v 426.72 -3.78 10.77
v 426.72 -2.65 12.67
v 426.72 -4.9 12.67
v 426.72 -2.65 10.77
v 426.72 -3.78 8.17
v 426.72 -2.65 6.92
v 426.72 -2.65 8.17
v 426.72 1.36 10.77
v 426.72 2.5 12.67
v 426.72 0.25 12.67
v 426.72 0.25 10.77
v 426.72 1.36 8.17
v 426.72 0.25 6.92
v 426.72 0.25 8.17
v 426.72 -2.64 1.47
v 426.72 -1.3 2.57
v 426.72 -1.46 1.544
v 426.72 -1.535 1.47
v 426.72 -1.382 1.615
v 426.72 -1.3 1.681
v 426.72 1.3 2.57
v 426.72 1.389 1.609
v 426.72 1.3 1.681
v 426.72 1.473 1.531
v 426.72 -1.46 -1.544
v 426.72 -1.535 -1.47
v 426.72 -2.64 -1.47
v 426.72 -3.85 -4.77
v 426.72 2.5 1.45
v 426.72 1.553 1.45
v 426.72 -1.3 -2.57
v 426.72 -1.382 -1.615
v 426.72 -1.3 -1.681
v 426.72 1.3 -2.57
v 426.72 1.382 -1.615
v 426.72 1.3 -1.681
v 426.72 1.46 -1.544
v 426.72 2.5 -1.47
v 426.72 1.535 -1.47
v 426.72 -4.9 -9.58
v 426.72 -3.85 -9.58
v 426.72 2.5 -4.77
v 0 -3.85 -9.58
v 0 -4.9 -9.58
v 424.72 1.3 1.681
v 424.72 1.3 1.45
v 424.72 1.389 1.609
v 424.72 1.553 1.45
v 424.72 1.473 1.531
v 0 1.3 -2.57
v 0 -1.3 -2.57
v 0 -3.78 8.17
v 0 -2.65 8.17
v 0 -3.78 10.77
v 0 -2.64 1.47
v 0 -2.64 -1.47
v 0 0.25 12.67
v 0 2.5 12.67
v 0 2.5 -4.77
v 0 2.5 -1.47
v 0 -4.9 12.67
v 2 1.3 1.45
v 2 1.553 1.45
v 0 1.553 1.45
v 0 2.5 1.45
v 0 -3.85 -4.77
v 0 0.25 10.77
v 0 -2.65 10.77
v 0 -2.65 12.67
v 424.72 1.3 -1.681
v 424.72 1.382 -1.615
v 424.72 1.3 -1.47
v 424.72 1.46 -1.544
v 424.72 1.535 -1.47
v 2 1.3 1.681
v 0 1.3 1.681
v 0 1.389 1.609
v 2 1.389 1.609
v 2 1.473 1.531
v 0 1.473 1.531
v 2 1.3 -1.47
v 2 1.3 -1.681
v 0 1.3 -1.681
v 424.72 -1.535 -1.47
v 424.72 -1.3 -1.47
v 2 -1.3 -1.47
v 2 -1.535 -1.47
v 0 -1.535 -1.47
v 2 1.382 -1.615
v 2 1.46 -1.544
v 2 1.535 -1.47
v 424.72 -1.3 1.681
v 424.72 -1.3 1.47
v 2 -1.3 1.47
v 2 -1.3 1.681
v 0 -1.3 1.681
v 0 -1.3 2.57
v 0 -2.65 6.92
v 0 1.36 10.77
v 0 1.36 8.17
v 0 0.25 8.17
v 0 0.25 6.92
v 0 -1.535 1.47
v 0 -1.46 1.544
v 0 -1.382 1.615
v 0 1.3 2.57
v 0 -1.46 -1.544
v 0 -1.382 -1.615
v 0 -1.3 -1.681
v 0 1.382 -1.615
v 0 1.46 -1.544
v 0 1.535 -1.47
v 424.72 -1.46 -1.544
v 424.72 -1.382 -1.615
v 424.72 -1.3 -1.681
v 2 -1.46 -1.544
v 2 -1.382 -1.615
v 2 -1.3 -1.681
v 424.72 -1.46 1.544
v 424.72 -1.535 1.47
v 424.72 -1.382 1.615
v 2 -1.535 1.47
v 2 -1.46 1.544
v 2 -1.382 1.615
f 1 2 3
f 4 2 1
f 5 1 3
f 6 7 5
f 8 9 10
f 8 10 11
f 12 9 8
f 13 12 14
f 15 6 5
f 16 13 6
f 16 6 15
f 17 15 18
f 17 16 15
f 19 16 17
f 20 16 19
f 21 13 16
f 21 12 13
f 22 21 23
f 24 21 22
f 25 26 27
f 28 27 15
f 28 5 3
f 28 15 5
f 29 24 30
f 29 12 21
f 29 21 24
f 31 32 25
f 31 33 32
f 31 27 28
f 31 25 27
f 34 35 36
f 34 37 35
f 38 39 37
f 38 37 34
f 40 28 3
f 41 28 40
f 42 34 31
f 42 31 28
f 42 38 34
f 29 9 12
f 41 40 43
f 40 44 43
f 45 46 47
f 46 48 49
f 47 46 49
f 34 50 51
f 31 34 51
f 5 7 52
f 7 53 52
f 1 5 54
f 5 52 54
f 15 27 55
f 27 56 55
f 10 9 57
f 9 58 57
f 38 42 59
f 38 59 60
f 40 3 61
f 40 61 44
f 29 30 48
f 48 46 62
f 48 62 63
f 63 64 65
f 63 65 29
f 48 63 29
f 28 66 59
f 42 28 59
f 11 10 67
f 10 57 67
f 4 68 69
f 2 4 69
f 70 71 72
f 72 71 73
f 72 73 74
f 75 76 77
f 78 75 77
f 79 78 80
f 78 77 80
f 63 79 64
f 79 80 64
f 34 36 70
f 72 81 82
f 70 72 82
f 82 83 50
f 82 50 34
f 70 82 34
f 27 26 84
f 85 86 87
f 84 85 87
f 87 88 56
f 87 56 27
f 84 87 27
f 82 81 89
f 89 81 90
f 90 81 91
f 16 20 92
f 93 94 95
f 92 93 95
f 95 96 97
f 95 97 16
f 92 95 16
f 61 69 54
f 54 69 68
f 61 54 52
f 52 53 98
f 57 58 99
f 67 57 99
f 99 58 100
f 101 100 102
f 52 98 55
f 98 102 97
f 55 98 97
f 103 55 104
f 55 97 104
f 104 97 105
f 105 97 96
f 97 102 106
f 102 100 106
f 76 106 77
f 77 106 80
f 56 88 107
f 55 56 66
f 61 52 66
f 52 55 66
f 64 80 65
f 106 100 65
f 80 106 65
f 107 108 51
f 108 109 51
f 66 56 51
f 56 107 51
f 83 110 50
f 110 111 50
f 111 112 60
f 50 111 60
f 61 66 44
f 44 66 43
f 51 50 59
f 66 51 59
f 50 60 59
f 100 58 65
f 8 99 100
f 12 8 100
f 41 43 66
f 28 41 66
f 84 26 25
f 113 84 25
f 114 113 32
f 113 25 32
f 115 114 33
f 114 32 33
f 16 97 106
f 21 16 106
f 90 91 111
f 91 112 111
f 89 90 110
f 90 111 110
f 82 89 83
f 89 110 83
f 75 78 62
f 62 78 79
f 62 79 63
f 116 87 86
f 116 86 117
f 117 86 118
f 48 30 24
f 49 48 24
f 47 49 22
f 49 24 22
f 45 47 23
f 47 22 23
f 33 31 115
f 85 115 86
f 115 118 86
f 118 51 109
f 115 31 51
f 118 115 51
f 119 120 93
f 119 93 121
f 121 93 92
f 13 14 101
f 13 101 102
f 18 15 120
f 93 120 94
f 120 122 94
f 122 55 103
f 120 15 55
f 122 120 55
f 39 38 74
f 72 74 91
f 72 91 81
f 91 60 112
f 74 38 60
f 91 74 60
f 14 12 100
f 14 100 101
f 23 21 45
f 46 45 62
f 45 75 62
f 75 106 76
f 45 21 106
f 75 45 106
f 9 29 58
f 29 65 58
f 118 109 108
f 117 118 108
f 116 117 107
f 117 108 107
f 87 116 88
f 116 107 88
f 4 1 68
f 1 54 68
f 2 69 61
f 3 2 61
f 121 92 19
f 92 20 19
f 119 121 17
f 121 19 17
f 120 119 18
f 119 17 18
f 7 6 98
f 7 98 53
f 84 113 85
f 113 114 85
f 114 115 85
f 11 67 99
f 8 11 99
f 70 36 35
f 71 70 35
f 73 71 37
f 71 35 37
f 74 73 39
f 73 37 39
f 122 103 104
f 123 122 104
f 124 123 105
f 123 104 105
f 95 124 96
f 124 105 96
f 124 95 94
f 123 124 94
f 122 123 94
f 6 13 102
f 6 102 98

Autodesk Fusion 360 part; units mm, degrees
sketch "Sketch1" plane through (0, 0, 0) normal (1, 0, 0) x (0, 0, -1)
  line L0 (-12.67, -4.9) -> (9.58, -4.9)
  line L1 (9.58, -4.9) -> (9.58, -3.85)
  line L2 (9.58, -3.85) -> (4.77, -3.85)
  line L3 (4.77, -3.85) -> (4.77, 2.5)
  line L4 (4.77, 2.5) -> (1.47, 2.5)
  line L5 (1.47, 2.5) -> (1.47, 1.3)
  line L6 (1.47, 1.3) -> (2.57, 1.3)
  line L7 (2.57, 1.3) -> (2.57, -1.3)
  line L8 (2.57, -1.3) -> (1.47, -1.3)
  line L9 (1.47, -1.3) -> (1.47, -2.64)
  line L10 (1.47, -2.64) -> (-1.47, -2.64)
  line L11 (-1.47, -2.64) -> (-1.47, -1.3)
  line L12 (-1.47, -1.3) -> (-2.57, -1.3)
  line L13 (-2.57, -1.3) -> (-2.57, 1.3)
  line L14 (-2.57, 1.3) -> (-1.45, 1.3)
  line L15 (-1.45, 1.3) -> (-1.45, 2.5)
  line L16 (-1.45, 2.5) -> (-12.67, 2.5)
  line L17 (-12.67, 2.5) -> (-12.67, 0.25)
  line L18 (-12.67, 0.25) -> (-10.77, 0.25)
  line L19 (-10.77, 0.25) -> (-10.77, 1.36)
  line L20 (-10.77, 1.36) -> (-8.17, 1.36)
  line L21 (-8.17, 1.36) -> (-8.17, 0.25)
  line L22 (-8.17, 0.25) -> (-6.92, 0.25)
  line L23 (-6.92, 0.25) -> (-6.92, -2.65)
  line L24 (-6.92, -2.65) -> (-8.17, -2.65)
  line L25 (-8.17, -2.65) -> (-8.17, -3.78)
  line L26 (-8.17, -3.78) -> (-10.77, -3.78)
  line L27 (-10.77, -3.78) -> (-10.77, -2.65)
  line L28 (-10.77, -2.65) -> (-12.67, -2.65)
  line L29 (-12.67, -2.65) -> (-12.67, -4.9)
  line L30 (-2.57, 0) -> (2.57, 0) construction
  line L31 (0, -2.64) -> (0, 0) construction
  circle A0 centre (0, 0) radius 2.125
  dimension "d1" = 22.25
  dimension "d2" = 1.05
  dimension "d3" = 7.4
  dimension "d4" = 3.3
  dimension "d5" = 17.44
  dimension "d6" = 11.22
  dimension "d7" = 1.14
  dimension "d8" = 2.25
  dimension "d9" = 2.25
  dimension "d10" = 5.14
  dimension "d11" = 2.6
  dimension "d12" = 5.14
  dimension "d13" = 5.75
  dimension "d14" = 2.6
  dimension "d15" = 1.9
  dimension "d16" = 1.2
  dimension "d17" = 5.14
  dimension "d18" = 2.2
  dimension "d23" = 4.25
extrude "Extrude1" add sketch "Sketch1" along normal blind 426.72 contours L0 L1 L2 L3 L4 L5 L6 L7 L8 L9 L10 L11 L12 L13 L14 L15 L16 L17 L18 L19 L20 L21 L22 L23 L24 L25 L26 L27 L28 L29 A0 | L5 L6 A0 | L14 L15 A0 | L8 L9 A0 | L11 L12 A0
extrude "Extrude2" cut sketch "Sketch1" along normal blind 2 contours L5 L6 A0 | L14 L15 A0 | L8 L9 A0 | L11 L12 A0
ref_plane "WorkPlane1" through (213.36, -1.2, 1.545) normal (1, 0, 0) x (0, 0, -1)
mirror "Mirror1" about plane through (213.36, -1.2, 1.545) normal (1, 0, 0) of "Extrude2"
equation "d9 = d8"
equation "hp_units = 84"
equation "hp_constant = 5.08 mm"
equation "d21 = hp_constant * hp_units"
